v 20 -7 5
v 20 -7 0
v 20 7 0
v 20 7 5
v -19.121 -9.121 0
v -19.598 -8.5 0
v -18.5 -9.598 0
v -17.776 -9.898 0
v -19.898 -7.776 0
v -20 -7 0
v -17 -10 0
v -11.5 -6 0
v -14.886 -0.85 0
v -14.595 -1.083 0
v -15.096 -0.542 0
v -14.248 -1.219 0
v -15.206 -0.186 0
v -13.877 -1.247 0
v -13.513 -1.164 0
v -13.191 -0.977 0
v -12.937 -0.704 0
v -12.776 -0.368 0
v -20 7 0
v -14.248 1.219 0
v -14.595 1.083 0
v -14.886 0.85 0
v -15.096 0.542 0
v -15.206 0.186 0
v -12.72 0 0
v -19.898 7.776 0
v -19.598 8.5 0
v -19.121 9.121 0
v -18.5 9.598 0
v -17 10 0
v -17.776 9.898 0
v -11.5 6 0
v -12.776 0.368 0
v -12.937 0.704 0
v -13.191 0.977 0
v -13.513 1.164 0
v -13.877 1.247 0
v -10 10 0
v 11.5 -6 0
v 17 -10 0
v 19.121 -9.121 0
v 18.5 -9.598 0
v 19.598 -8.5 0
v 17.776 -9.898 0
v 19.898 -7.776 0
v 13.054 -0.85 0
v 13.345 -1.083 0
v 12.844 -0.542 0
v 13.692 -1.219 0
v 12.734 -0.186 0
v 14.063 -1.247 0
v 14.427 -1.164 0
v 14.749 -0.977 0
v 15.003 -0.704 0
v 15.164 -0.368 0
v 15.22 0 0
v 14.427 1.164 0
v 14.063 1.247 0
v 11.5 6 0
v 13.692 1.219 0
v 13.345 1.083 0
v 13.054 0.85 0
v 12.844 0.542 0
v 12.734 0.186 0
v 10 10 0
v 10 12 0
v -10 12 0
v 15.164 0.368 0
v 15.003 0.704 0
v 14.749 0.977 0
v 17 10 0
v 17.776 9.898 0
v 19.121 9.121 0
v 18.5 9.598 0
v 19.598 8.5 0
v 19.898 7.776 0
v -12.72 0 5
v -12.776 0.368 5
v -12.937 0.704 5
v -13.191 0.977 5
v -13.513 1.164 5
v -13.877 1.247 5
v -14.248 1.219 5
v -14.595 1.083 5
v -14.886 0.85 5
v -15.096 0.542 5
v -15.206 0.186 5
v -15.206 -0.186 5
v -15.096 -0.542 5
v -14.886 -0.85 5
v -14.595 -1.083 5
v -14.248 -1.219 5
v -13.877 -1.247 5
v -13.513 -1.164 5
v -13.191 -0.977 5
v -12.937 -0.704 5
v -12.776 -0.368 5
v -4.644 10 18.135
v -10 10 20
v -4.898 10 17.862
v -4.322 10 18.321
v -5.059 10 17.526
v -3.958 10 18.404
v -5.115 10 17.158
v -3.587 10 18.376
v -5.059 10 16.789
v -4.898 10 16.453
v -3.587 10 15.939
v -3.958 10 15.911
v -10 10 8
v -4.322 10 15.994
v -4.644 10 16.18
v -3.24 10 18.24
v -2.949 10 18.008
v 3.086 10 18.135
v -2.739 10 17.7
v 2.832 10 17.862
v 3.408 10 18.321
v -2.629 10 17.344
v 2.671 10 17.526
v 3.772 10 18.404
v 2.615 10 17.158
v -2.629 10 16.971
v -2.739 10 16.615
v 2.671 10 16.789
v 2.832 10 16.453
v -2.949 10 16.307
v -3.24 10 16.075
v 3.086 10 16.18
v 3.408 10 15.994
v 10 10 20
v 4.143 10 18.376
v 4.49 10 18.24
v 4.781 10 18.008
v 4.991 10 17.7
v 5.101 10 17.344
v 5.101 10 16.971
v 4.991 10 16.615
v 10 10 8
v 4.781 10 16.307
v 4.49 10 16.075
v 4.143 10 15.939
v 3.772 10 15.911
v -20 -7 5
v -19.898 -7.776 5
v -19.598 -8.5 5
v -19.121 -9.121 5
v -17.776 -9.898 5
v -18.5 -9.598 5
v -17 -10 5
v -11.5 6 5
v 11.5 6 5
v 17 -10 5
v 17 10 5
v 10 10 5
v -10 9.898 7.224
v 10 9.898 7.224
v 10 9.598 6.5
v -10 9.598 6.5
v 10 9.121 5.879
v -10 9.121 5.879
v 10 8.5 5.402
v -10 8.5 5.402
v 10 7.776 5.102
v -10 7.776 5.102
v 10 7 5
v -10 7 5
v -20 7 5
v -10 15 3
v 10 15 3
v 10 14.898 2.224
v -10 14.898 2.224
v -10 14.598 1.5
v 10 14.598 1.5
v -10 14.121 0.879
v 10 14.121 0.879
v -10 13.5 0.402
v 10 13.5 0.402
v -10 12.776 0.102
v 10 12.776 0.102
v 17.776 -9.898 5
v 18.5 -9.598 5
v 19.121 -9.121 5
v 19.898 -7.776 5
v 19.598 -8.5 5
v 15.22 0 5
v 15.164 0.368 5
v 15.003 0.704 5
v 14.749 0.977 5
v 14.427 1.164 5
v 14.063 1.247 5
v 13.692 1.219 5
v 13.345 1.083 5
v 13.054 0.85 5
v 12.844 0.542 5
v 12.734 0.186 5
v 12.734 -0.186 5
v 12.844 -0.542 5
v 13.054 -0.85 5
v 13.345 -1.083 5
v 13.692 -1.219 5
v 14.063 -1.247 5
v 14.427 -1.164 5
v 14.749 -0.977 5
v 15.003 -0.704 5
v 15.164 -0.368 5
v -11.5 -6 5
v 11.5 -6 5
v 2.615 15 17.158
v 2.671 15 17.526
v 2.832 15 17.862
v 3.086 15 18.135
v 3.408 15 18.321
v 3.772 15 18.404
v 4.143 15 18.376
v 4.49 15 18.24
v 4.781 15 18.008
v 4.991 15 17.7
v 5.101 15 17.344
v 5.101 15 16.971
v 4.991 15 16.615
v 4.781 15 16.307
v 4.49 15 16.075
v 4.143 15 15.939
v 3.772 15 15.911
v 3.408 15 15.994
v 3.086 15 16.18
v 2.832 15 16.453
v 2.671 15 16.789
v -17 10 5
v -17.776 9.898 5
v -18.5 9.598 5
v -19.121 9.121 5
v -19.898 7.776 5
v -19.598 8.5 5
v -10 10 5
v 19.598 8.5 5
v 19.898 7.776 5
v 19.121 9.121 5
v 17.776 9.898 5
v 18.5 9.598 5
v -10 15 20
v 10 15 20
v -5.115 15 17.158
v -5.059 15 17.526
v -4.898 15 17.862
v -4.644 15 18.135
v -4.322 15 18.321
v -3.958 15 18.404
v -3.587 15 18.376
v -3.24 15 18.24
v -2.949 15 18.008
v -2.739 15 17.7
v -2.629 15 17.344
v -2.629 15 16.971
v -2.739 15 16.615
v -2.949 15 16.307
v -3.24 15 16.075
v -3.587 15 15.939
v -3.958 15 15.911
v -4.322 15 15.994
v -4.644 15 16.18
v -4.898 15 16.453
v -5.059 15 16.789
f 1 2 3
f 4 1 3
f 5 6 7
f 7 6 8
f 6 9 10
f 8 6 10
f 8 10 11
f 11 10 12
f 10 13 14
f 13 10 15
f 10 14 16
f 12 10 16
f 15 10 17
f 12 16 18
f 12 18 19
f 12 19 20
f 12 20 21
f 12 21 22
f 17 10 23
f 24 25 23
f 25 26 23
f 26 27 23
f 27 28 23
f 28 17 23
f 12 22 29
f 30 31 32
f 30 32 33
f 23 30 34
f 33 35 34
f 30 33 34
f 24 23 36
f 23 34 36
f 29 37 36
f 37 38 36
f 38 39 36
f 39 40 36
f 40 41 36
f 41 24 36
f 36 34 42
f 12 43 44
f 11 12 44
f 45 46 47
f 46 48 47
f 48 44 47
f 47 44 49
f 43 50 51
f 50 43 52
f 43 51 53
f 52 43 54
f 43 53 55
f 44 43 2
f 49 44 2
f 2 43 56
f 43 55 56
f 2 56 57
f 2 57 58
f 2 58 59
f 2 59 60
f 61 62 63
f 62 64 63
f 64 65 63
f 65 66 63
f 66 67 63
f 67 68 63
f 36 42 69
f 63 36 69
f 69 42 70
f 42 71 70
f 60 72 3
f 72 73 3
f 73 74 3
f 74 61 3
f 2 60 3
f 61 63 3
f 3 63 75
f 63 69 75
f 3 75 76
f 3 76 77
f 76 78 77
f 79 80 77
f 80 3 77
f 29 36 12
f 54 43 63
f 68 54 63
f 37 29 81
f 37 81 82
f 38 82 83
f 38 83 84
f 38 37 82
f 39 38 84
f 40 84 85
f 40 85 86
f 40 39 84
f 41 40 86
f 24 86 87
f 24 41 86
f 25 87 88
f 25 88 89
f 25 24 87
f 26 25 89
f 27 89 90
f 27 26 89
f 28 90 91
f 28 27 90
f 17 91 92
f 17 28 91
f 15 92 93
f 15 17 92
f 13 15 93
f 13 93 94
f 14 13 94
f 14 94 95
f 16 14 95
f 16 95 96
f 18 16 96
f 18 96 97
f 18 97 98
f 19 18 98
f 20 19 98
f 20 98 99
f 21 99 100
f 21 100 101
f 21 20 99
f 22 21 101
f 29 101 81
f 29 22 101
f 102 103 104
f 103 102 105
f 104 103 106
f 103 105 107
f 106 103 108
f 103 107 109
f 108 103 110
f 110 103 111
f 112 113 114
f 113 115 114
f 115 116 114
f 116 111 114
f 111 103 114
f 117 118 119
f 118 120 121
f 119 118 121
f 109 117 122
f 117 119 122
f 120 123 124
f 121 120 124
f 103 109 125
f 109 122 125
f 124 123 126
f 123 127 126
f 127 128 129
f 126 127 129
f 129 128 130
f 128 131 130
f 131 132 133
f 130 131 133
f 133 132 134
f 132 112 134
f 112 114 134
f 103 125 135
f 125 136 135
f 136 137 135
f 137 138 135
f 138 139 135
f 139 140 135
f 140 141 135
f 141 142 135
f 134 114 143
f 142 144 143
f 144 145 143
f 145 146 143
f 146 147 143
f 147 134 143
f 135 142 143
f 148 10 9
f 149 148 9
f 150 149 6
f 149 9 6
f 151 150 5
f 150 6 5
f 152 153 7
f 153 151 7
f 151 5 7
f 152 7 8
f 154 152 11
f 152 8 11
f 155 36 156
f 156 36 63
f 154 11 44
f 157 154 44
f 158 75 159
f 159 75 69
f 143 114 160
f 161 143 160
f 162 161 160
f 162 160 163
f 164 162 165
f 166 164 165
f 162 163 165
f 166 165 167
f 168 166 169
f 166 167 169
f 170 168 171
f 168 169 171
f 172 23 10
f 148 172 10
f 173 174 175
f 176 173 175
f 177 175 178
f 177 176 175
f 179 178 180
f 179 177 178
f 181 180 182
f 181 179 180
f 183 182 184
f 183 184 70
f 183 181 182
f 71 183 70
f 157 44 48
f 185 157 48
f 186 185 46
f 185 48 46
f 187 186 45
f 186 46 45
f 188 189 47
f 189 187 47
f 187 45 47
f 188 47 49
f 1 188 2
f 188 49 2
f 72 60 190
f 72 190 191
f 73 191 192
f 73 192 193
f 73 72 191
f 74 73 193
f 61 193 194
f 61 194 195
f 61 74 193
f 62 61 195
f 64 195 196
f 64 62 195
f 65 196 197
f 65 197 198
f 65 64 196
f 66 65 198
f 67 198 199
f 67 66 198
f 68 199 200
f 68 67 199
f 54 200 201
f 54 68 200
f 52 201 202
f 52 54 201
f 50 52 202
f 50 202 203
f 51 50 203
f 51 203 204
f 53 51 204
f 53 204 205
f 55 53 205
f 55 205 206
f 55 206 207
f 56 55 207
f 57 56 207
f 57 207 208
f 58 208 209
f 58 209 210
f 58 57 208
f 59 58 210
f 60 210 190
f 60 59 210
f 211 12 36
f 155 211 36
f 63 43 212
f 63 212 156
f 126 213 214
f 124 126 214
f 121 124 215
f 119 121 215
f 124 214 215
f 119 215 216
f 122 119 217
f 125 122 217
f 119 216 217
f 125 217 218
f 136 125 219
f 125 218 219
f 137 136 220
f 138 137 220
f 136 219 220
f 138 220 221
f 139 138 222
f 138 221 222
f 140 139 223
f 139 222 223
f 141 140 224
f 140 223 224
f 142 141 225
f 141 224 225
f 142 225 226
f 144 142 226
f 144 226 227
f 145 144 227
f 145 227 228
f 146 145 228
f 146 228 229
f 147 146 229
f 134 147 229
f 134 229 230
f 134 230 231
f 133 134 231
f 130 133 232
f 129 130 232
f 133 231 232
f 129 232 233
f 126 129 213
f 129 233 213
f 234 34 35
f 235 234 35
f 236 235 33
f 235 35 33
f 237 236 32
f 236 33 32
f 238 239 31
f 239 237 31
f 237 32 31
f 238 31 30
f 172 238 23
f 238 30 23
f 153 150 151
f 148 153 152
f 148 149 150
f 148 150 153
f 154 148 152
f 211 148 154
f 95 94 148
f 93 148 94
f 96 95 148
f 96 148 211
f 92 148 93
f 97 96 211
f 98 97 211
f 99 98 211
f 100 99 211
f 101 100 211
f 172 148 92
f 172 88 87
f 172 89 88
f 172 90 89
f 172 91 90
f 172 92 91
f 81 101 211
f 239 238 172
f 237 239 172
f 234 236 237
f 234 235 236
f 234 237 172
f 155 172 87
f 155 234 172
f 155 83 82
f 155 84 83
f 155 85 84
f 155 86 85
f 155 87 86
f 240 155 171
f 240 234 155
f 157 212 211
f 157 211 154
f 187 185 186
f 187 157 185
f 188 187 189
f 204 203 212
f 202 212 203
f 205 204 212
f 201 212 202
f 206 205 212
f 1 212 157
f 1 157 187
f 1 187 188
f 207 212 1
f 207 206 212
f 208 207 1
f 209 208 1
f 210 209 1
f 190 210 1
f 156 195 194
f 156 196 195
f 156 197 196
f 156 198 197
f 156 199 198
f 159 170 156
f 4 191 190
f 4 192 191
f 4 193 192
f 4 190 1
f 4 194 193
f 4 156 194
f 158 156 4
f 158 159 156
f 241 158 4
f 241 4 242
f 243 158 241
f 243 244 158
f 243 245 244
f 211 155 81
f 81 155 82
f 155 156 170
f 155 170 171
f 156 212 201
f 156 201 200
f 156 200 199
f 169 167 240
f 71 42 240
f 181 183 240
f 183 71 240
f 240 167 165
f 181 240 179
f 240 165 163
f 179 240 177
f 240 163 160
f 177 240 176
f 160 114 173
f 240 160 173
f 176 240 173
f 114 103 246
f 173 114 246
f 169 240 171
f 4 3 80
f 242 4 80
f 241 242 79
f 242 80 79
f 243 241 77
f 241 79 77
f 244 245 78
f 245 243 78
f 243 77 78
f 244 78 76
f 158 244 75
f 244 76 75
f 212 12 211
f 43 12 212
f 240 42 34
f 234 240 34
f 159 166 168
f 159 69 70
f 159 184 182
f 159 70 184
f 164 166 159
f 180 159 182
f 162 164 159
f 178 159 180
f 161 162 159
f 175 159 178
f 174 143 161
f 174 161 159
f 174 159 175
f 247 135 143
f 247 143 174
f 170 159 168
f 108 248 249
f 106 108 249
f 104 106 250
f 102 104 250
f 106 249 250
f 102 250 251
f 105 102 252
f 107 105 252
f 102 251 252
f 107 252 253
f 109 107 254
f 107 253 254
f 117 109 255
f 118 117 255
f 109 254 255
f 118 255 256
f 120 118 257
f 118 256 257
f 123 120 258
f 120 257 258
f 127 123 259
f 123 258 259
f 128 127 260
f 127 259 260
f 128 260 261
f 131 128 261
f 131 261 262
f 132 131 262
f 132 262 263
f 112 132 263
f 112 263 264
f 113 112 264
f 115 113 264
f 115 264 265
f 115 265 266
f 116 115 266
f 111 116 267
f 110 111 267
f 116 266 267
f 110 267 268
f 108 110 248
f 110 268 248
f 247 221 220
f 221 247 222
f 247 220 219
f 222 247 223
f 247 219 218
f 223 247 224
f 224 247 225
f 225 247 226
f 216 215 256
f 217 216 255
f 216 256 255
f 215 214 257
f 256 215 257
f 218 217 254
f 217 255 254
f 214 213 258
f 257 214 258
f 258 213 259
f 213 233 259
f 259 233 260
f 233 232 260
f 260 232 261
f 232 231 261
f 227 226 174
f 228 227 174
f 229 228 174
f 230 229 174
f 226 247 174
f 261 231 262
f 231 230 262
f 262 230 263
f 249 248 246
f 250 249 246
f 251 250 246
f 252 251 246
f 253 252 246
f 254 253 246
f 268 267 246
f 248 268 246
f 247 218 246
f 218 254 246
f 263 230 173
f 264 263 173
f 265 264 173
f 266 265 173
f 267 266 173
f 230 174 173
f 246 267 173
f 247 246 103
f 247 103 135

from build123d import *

# Parameters (mm, degrees)
F1_DEPTH    = 20
F0_R        = 1.25
F0_W        = 23
F0_H        = 12
F2_DEPTH    = 5
F3_R        = 1.25
F4_DEPTH    = 5
F5_T1_DEPTH = 20
F5_T3_DEPTH = 20
F5_T5_DEPTH = 35


# Not quite as in the source:
# - a fillet or chamfer that OpenCascade refuses, or shapes differently, is made with other operations: its cross-section is extruded or revolved along the edge and cut away or added


with BuildPart() as f1:
    # F0 (on Top) → F1 (new body)
    with BuildSketch(Plane.XY):
        Polygon((-10, 15), (-10, 10), (10, 10), (10, 15), (0, 15), align=None)
    extrude(amount=F1_DEPTH)

    # F0 (on Top) → F2 (join)
    with BuildSketch(Plane.XY):
        Polygon((-10, 10), (-20, 10), (-20, -10), (20, -10), (20, 10), (10, 10), align=None)
        with Locations((-13.97, 0)):
            Circle(F0_R, mode=Mode.SUBTRACT)
        Rectangle(F0_W, F0_H, mode=Mode.SUBTRACT)
        with Locations((13.97, 0)):
            Circle(F0_R, mode=Mode.SUBTRACT)
    extrude(amount=F2_DEPTH)

    # F3 (on face) → F4 (cut)
    with BuildSketch(Plane(origin=(0, 15, 0), x_dir=(-1, 0, 0), z_dir=(0, 1, 0))):
        with Locations((3.865, 17.1576076342)):
            Circle(F3_R)
        with Locations((-3.865, 17.1576076342)):
            Circle(F3_R)
    extrude(amount=-F4_DEPTH, mode=Mode.SUBTRACT)

    # F5: fillet of radius 3 on 8 edges, made by hand

    # F5_s2 → F5_t1 (join)
    with BuildSketch(Plane.YZ.offset(-10)):
        with BuildLine():
            ThreePointArc((10, 8), (9.1213203436, 5.8786796564), (7, 5))
            Line((7, 5), (10, 5))
            Line((10, 5), (10, 8))
        make_face()
    extrude(amount=F5_T1_DEPTH)

    # F5_s4 → F5_t3 (cut)
    with BuildSketch(Plane.XY.offset(-7.5)):
        with BuildLine():
            ThreePointArc((-17, 10), (-19.1213203436, 9.1213203436), (-20, 7))
            Line((-20, 7), (-20, 10))
            Line((-20, 10), (-17, 10))
        make_face()
        with BuildLine():
            ThreePointArc((20, 7), (19.1213203436, 9.1213203436), (17, 10))
            Line((17, 10), (20, 10))
            Line((20, 10), (20, 7))
        make_face()
        with BuildLine():
            ThreePointArc((17, -10), (19.1213203436, -9.1213203436), (20, -7))
            Line((20, -7), (20, -10))
            Line((20, -10), (17, -10))
        make_face()
        with BuildLine():
            ThreePointArc((-20, -7), (-19.1213203436, -9.1213203436), (-17, -10))
            Line((-17, -10), (-20, -10))
            Line((-20, -10), (-20, -7))
        make_face()
    extrude(amount=F5_T3_DEPTH, mode=Mode.SUBTRACT)

    # F5_s6 → F5_t5 (cut)
    with BuildSketch(Plane.YZ.offset(-17.5)):
        with BuildLine():
            ThreePointArc((15, 3), (14.1213203436, 0.8786796564), (12, 0))
            Line((12, 0), (15, 0))
            Line((15, 0), (15, 3))
        make_face()
    extrude(amount=F5_T5_DEPTH, mode=Mode.SUBTRACT)


solid = f1.part
